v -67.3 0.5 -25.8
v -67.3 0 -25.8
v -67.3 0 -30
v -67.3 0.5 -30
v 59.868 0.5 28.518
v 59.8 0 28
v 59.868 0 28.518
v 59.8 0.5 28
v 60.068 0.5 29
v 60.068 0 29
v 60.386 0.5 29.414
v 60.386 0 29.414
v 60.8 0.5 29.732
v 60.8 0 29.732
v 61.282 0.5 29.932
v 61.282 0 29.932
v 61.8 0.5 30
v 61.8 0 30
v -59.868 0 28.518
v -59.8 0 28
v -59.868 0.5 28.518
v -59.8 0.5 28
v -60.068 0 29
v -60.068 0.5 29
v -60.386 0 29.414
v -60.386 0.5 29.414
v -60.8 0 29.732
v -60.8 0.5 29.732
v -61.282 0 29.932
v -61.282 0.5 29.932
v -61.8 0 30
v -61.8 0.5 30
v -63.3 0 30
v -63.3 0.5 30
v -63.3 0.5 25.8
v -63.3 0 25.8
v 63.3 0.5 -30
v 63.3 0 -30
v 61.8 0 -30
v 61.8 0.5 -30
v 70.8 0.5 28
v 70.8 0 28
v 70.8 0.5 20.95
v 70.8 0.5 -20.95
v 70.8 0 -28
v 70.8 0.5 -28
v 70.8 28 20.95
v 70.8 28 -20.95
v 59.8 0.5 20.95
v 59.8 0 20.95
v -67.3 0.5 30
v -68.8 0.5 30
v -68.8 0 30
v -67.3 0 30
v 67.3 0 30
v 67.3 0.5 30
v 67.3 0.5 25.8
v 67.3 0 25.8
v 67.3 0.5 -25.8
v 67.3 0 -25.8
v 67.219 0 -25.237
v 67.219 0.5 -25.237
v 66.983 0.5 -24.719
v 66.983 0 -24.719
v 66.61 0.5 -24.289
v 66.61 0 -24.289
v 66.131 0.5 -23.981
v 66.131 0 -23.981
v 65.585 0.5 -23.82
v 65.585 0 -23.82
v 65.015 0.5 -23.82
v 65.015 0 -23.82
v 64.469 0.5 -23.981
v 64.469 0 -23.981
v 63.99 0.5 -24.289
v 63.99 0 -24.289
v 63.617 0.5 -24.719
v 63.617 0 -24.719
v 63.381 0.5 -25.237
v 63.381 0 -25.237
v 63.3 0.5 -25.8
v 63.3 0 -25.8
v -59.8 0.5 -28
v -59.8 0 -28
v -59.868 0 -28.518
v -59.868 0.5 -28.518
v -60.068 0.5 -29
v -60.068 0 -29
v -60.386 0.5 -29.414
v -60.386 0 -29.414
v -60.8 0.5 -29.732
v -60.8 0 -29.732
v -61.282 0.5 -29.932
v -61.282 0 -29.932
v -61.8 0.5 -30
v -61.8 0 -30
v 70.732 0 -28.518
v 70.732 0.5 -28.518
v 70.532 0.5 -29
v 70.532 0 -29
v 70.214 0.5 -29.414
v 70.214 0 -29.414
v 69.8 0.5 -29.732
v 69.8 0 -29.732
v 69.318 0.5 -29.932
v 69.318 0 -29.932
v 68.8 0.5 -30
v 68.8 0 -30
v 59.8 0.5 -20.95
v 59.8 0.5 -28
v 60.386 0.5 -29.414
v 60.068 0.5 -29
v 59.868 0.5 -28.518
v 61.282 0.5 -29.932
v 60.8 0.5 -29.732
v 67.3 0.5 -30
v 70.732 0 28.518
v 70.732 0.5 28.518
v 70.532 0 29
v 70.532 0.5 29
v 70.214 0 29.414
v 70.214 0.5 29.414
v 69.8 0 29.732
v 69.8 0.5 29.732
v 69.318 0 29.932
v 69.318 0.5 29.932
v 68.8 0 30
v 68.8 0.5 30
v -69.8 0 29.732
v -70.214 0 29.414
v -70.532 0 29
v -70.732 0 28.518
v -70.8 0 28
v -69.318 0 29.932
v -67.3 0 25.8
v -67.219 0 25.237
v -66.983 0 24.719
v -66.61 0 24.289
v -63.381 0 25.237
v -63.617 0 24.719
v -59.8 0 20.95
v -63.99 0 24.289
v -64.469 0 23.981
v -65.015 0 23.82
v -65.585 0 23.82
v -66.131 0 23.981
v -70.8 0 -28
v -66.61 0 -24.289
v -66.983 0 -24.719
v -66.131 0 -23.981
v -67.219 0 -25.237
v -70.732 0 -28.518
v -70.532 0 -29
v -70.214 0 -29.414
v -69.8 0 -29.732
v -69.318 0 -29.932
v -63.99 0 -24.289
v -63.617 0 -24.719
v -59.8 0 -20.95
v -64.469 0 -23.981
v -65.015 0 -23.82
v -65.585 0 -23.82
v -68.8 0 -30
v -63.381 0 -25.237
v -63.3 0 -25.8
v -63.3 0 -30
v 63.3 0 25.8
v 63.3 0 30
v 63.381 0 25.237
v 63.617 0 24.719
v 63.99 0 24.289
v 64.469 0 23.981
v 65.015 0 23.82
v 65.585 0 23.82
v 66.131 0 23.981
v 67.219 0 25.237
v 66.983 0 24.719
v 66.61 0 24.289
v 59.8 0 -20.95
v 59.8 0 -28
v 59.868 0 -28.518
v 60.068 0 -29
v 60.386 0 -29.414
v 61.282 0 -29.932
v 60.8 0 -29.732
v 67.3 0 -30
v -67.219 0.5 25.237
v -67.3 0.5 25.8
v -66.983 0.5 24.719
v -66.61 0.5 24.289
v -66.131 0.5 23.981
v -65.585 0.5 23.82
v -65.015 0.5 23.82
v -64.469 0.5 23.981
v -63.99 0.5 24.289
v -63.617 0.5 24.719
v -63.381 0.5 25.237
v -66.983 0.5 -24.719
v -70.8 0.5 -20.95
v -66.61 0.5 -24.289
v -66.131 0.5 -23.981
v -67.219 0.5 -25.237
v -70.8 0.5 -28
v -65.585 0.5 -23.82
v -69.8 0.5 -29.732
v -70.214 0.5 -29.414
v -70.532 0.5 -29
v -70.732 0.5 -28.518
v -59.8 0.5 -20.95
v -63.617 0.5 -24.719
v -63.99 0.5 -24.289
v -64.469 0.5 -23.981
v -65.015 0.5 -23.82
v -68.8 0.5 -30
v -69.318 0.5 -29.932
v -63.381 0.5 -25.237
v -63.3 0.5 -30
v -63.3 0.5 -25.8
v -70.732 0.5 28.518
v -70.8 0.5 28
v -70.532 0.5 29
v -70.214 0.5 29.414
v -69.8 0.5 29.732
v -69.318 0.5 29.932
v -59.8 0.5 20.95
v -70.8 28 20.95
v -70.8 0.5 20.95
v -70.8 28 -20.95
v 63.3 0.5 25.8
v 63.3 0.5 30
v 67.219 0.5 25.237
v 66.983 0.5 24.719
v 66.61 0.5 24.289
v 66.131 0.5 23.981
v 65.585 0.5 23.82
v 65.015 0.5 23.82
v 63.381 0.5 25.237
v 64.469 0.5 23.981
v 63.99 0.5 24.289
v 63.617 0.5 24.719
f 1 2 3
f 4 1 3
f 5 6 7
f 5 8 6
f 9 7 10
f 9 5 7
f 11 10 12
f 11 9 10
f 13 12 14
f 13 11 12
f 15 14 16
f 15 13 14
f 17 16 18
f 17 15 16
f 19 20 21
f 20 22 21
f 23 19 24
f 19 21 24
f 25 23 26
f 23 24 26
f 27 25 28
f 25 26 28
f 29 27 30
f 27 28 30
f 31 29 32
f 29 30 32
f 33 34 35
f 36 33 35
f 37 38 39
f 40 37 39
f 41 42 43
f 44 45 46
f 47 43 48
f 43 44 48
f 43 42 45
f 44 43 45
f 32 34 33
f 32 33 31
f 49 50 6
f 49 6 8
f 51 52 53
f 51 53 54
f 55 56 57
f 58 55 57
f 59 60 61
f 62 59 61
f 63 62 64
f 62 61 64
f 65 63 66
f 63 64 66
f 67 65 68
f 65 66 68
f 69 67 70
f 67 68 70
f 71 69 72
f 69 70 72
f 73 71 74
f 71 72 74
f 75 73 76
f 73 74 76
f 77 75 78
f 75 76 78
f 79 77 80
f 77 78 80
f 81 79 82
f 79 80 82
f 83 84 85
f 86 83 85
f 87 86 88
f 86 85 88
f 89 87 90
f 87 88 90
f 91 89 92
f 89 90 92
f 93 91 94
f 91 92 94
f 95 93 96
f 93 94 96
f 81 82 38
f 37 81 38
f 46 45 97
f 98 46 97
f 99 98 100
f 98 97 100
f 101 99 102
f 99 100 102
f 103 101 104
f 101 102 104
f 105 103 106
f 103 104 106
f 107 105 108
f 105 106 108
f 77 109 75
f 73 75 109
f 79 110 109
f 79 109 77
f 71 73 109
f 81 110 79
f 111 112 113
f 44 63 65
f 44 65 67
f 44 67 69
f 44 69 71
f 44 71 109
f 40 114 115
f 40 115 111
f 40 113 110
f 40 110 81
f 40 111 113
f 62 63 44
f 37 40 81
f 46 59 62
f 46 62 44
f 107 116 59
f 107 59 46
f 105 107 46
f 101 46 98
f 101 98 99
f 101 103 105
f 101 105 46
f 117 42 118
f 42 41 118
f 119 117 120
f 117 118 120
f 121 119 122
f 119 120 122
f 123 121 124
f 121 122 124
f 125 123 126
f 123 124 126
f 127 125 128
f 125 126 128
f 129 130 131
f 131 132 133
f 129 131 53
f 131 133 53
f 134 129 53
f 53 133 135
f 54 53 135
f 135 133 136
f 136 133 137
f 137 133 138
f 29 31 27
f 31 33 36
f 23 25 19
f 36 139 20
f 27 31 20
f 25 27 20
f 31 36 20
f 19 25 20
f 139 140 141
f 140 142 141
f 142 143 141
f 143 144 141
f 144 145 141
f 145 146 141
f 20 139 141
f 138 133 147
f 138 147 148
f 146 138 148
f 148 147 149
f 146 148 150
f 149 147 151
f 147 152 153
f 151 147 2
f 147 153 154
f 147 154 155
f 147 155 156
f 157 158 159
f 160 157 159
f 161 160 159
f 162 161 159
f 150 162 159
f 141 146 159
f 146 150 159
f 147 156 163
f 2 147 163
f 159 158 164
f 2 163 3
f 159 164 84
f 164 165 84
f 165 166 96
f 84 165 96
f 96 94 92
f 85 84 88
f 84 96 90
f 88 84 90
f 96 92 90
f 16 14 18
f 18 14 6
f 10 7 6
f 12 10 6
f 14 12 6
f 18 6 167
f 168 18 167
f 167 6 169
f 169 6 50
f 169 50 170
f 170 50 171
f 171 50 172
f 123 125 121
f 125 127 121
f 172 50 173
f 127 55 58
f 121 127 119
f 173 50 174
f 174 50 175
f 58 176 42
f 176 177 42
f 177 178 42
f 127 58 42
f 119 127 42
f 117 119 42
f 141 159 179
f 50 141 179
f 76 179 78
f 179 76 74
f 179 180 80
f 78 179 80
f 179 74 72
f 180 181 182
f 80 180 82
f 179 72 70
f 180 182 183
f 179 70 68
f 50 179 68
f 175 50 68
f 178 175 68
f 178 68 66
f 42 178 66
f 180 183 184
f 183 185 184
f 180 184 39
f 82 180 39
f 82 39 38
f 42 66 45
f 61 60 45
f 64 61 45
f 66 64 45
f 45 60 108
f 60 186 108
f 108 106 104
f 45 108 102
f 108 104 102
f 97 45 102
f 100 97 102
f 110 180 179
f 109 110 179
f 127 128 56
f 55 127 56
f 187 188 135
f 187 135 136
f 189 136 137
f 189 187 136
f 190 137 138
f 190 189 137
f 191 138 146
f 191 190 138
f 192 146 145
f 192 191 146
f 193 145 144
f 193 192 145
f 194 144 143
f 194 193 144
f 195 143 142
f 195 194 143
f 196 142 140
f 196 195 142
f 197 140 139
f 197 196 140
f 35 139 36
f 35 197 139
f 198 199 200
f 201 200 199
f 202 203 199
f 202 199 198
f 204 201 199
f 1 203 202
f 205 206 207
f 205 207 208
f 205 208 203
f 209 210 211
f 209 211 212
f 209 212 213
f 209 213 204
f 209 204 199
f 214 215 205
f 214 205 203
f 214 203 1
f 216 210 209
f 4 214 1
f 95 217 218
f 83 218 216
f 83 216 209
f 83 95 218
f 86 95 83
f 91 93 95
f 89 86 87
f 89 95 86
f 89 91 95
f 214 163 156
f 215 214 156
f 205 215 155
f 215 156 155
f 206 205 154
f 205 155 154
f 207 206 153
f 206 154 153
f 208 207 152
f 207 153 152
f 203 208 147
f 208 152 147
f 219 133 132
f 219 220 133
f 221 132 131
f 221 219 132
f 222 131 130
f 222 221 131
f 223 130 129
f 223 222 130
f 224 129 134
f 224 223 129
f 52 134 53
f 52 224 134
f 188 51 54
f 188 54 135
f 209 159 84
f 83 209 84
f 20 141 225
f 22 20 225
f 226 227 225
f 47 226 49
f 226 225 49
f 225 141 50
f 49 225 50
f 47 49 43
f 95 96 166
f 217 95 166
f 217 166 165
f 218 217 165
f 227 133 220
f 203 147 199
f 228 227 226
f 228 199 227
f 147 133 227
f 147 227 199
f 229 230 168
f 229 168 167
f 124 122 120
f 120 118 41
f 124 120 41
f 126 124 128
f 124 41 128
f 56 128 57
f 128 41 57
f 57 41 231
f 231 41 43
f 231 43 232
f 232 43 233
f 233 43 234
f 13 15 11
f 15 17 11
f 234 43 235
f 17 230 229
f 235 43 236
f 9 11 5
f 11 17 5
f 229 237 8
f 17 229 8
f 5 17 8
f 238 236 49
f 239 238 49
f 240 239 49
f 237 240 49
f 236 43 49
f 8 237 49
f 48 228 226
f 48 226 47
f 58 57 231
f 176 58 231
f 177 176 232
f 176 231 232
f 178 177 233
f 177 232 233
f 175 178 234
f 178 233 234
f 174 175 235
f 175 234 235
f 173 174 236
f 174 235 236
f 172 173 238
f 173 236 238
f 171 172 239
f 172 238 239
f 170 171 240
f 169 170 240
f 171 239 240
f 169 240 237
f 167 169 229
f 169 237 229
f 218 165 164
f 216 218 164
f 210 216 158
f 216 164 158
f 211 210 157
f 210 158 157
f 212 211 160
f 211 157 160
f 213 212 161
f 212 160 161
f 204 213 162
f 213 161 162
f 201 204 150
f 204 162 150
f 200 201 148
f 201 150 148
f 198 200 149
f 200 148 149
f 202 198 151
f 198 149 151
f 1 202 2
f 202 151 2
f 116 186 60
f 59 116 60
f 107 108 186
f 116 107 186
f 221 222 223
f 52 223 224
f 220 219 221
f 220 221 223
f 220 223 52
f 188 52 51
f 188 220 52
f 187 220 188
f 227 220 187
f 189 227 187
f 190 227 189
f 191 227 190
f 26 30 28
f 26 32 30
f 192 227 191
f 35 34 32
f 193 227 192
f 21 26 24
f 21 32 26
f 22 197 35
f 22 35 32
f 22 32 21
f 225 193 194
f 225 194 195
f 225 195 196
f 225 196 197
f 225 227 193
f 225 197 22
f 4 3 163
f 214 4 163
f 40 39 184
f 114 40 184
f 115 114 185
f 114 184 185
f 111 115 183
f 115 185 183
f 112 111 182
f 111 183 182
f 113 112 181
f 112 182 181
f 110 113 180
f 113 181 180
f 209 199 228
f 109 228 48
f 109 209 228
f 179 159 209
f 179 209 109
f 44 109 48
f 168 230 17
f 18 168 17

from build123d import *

# Parameters (mm, degrees)
SKETCH1_W            = 141.6
SKETCH1_H            = 41.9
BOSS_EXTRUDE1_DEPTH  = 28
SKETCH2_W            = 11
SKETCH2_H            = 0.5
BOSS_EXTRUDE2_DEPTH  = 9.05
FILLET1_R            = 2
SKETCH3_W            = 4
SKETCH3_H            = 4.2
CUT_EXTRUDE1_DEPTH   = 9.05
FILLET1_OF_MIRROR1_R = 2
MIRROR2_DEPTH        = 0.5


# Read off the part's stored shape, not the designer's step: Mirror2
with BuildPart() as part:
    # Sketch1 → Boss-Extrude1 (new body)
    with BuildSketch(Plane(origin=(0, 0, 0), x_dir=(1, 0, 0), z_dir=(0, 1, 0))):
        Rectangle(SKETCH1_W, SKETCH1_H)
    extrude(amount=BOSS_EXTRUDE1_DEPTH)

    # Sketch2 → Boss-Extrude2 (add)
    with BuildSketch(Plane.XY.offset(20.95)):
        with Locations((-65.3, 0.25)):
            Rectangle(SKETCH2_W, SKETCH2_H)
    boss_extrude2 = extrude(amount=BOSS_EXTRUDE2_DEPTH)

    # Fillet1
    fillet1_edges = [part.edges().sort_by_distance(p)[0] for p in [
        (-59.8, 0.25, 30),
        (-70.8, 0.25, 30),
    ]]
    fillet(fillet1_edges, radius=FILLET1_R)

    # Sketch3 → Cut-Extrude1 (cut)
    with BuildSketch(Plane(origin=(0, 0.5, 0), x_dir=(1, 0, 0), z_dir=(0, 1, 0))):
        with BuildLine():
            ThreePointArc((-67.3, -25.8), (-65.3, -23.8), (-63.3, -25.8))
            Line((-63.3, -25.8), (-67.3, -25.8))
        make_face()
        with Locations((-65.3, -27.9)):
            Rectangle(SKETCH3_W, SKETCH3_H)
    cut_extrude1 = extrude(amount=-CUT_EXTRUDE1_DEPTH, mode=Mode.SUBTRACT)

    # Mirror1: Boss-Extrude2, Cut-Extrude1 across plane
    add(boss_extrude2.mirror(Plane(origin=(0, 0, 0), x_dir=(0, 0, 1), z_dir=(1, 0, 0))))
    add(cut_extrude1.mirror(Plane(origin=(0, 0, 0), x_dir=(0, 0, 1), z_dir=(1, 0, 0))), mode=Mode.SUBTRACT)

    # Fillet1 of Mirror1
    fillet1_of_mirror1_edges = [part.edges().sort_by_distance(p)[0] for p in [
        (59.8, 0.25, 30),
        (70.8, 0.25, 30),
    ]]
    fillet(fillet1_of_mirror1_edges, radius=FILLET1_OF_MIRROR1_R)

    # Mirror2 outline → Mirror2 (add)
    with BuildSketch(Plane(origin=(0, 0, 0), x_dir=(1, 0, 0), z_dir=(0, 1, 0))):
        with BuildLine():
            Line((59.8, 28), (59.8, 20.95))
            Line((59.8, 20.95), (70.8, 20.95))
            Line((70.8, 20.95), (70.8, 28))
            ThreePointArc((70.8, 28), (70.214213562, 29.414213562), (68.8, 30))
            Line((68.8, 30), (67.3, 30))
            Line((67.3, 30), (67.3, 25.8))
            ThreePointArc((67.3, 25.8), (65.3, 23.8), (63.3, 25.8))
            Line((63.3, 25.8), (63.3, 30))
            Line((63.3, 30), (61.8, 30))
            ThreePointArc((61.8, 30), (60.385786438, 29.414213562), (59.8, 28))
        make_face()
        with BuildLine():
            Line((-67.3, 30), (-68.8, 30))
            ThreePointArc((-68.8, 30), (-70.214213562, 29.414213562), (-70.8, 28))
            Line((-70.8, 28), (-70.8, 20.95))
            Line((-70.8, 20.95), (-59.8, 20.95))
            Line((-59.8, 20.95), (-59.8, 28))
            ThreePointArc((-59.8, 28), (-60.385786438, 29.414213562), (-61.8, 30))
            Line((-61.8, 30), (-63.3, 30))
            Line((-63.3, 30), (-63.3, 25.8))
            ThreePointArc((-63.3, 25.8), (-65.3, 23.8), (-67.3, 25.8))
            Line((-67.3, 25.8), (-67.3, 30))
        make_face()
    extrude(amount=MIRROR2_DEPTH)


solid = part.part
